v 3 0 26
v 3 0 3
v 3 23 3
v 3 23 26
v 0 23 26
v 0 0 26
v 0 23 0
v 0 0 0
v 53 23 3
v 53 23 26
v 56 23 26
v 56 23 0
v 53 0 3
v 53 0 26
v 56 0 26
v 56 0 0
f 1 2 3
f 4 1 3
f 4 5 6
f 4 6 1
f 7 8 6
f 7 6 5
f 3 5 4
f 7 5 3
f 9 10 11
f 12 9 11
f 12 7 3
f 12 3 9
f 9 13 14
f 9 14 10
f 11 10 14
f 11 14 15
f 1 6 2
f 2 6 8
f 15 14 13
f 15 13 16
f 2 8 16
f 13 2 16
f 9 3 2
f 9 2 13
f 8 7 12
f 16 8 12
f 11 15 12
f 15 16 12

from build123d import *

# Parameters (mm, degrees)
BOX_W         = 3
BOX_H         = 23
BOX_DEPTH     = 23
ARRAY_X_COUNT = 2
ARRAY_X_PITCH = 53
BOX001_W      = 56
BOX001_H      = 23
BOX001_DEPTH  = 3


with BuildPart() as baseandtoparray:
    # Box → Box (new body)
    with BuildSketch(Plane.XY.offset(3)):
        with Locations((1.5, 11.5)):
            Rectangle(BOX_W, BOX_H)
    extrude(amount=BOX_DEPTH)

    # Array X: baseAndTopArray ×2


with BuildPart() as baseandtoparray_1:
    add(baseandtoparray.part)
    with Locations(*[(i * ARRAY_X_PITCH, 0, 0) for i in range(1, ARRAY_X_COUNT)]):
        add(baseandtoparray.part)


with BuildPart() as servoholderforlaptop:
    # Box001 → Box001 (new body)
    with BuildSketch(Plane.XY):
        with Locations((28, 11.5)):
            Rectangle(BOX001_W, BOX001_H)
    extrude(amount=BOX001_DEPTH)

    # Fusion: union baseAndTopArray
    add(baseandtoparray_1.part)


solid = servoholderforlaptop.part
